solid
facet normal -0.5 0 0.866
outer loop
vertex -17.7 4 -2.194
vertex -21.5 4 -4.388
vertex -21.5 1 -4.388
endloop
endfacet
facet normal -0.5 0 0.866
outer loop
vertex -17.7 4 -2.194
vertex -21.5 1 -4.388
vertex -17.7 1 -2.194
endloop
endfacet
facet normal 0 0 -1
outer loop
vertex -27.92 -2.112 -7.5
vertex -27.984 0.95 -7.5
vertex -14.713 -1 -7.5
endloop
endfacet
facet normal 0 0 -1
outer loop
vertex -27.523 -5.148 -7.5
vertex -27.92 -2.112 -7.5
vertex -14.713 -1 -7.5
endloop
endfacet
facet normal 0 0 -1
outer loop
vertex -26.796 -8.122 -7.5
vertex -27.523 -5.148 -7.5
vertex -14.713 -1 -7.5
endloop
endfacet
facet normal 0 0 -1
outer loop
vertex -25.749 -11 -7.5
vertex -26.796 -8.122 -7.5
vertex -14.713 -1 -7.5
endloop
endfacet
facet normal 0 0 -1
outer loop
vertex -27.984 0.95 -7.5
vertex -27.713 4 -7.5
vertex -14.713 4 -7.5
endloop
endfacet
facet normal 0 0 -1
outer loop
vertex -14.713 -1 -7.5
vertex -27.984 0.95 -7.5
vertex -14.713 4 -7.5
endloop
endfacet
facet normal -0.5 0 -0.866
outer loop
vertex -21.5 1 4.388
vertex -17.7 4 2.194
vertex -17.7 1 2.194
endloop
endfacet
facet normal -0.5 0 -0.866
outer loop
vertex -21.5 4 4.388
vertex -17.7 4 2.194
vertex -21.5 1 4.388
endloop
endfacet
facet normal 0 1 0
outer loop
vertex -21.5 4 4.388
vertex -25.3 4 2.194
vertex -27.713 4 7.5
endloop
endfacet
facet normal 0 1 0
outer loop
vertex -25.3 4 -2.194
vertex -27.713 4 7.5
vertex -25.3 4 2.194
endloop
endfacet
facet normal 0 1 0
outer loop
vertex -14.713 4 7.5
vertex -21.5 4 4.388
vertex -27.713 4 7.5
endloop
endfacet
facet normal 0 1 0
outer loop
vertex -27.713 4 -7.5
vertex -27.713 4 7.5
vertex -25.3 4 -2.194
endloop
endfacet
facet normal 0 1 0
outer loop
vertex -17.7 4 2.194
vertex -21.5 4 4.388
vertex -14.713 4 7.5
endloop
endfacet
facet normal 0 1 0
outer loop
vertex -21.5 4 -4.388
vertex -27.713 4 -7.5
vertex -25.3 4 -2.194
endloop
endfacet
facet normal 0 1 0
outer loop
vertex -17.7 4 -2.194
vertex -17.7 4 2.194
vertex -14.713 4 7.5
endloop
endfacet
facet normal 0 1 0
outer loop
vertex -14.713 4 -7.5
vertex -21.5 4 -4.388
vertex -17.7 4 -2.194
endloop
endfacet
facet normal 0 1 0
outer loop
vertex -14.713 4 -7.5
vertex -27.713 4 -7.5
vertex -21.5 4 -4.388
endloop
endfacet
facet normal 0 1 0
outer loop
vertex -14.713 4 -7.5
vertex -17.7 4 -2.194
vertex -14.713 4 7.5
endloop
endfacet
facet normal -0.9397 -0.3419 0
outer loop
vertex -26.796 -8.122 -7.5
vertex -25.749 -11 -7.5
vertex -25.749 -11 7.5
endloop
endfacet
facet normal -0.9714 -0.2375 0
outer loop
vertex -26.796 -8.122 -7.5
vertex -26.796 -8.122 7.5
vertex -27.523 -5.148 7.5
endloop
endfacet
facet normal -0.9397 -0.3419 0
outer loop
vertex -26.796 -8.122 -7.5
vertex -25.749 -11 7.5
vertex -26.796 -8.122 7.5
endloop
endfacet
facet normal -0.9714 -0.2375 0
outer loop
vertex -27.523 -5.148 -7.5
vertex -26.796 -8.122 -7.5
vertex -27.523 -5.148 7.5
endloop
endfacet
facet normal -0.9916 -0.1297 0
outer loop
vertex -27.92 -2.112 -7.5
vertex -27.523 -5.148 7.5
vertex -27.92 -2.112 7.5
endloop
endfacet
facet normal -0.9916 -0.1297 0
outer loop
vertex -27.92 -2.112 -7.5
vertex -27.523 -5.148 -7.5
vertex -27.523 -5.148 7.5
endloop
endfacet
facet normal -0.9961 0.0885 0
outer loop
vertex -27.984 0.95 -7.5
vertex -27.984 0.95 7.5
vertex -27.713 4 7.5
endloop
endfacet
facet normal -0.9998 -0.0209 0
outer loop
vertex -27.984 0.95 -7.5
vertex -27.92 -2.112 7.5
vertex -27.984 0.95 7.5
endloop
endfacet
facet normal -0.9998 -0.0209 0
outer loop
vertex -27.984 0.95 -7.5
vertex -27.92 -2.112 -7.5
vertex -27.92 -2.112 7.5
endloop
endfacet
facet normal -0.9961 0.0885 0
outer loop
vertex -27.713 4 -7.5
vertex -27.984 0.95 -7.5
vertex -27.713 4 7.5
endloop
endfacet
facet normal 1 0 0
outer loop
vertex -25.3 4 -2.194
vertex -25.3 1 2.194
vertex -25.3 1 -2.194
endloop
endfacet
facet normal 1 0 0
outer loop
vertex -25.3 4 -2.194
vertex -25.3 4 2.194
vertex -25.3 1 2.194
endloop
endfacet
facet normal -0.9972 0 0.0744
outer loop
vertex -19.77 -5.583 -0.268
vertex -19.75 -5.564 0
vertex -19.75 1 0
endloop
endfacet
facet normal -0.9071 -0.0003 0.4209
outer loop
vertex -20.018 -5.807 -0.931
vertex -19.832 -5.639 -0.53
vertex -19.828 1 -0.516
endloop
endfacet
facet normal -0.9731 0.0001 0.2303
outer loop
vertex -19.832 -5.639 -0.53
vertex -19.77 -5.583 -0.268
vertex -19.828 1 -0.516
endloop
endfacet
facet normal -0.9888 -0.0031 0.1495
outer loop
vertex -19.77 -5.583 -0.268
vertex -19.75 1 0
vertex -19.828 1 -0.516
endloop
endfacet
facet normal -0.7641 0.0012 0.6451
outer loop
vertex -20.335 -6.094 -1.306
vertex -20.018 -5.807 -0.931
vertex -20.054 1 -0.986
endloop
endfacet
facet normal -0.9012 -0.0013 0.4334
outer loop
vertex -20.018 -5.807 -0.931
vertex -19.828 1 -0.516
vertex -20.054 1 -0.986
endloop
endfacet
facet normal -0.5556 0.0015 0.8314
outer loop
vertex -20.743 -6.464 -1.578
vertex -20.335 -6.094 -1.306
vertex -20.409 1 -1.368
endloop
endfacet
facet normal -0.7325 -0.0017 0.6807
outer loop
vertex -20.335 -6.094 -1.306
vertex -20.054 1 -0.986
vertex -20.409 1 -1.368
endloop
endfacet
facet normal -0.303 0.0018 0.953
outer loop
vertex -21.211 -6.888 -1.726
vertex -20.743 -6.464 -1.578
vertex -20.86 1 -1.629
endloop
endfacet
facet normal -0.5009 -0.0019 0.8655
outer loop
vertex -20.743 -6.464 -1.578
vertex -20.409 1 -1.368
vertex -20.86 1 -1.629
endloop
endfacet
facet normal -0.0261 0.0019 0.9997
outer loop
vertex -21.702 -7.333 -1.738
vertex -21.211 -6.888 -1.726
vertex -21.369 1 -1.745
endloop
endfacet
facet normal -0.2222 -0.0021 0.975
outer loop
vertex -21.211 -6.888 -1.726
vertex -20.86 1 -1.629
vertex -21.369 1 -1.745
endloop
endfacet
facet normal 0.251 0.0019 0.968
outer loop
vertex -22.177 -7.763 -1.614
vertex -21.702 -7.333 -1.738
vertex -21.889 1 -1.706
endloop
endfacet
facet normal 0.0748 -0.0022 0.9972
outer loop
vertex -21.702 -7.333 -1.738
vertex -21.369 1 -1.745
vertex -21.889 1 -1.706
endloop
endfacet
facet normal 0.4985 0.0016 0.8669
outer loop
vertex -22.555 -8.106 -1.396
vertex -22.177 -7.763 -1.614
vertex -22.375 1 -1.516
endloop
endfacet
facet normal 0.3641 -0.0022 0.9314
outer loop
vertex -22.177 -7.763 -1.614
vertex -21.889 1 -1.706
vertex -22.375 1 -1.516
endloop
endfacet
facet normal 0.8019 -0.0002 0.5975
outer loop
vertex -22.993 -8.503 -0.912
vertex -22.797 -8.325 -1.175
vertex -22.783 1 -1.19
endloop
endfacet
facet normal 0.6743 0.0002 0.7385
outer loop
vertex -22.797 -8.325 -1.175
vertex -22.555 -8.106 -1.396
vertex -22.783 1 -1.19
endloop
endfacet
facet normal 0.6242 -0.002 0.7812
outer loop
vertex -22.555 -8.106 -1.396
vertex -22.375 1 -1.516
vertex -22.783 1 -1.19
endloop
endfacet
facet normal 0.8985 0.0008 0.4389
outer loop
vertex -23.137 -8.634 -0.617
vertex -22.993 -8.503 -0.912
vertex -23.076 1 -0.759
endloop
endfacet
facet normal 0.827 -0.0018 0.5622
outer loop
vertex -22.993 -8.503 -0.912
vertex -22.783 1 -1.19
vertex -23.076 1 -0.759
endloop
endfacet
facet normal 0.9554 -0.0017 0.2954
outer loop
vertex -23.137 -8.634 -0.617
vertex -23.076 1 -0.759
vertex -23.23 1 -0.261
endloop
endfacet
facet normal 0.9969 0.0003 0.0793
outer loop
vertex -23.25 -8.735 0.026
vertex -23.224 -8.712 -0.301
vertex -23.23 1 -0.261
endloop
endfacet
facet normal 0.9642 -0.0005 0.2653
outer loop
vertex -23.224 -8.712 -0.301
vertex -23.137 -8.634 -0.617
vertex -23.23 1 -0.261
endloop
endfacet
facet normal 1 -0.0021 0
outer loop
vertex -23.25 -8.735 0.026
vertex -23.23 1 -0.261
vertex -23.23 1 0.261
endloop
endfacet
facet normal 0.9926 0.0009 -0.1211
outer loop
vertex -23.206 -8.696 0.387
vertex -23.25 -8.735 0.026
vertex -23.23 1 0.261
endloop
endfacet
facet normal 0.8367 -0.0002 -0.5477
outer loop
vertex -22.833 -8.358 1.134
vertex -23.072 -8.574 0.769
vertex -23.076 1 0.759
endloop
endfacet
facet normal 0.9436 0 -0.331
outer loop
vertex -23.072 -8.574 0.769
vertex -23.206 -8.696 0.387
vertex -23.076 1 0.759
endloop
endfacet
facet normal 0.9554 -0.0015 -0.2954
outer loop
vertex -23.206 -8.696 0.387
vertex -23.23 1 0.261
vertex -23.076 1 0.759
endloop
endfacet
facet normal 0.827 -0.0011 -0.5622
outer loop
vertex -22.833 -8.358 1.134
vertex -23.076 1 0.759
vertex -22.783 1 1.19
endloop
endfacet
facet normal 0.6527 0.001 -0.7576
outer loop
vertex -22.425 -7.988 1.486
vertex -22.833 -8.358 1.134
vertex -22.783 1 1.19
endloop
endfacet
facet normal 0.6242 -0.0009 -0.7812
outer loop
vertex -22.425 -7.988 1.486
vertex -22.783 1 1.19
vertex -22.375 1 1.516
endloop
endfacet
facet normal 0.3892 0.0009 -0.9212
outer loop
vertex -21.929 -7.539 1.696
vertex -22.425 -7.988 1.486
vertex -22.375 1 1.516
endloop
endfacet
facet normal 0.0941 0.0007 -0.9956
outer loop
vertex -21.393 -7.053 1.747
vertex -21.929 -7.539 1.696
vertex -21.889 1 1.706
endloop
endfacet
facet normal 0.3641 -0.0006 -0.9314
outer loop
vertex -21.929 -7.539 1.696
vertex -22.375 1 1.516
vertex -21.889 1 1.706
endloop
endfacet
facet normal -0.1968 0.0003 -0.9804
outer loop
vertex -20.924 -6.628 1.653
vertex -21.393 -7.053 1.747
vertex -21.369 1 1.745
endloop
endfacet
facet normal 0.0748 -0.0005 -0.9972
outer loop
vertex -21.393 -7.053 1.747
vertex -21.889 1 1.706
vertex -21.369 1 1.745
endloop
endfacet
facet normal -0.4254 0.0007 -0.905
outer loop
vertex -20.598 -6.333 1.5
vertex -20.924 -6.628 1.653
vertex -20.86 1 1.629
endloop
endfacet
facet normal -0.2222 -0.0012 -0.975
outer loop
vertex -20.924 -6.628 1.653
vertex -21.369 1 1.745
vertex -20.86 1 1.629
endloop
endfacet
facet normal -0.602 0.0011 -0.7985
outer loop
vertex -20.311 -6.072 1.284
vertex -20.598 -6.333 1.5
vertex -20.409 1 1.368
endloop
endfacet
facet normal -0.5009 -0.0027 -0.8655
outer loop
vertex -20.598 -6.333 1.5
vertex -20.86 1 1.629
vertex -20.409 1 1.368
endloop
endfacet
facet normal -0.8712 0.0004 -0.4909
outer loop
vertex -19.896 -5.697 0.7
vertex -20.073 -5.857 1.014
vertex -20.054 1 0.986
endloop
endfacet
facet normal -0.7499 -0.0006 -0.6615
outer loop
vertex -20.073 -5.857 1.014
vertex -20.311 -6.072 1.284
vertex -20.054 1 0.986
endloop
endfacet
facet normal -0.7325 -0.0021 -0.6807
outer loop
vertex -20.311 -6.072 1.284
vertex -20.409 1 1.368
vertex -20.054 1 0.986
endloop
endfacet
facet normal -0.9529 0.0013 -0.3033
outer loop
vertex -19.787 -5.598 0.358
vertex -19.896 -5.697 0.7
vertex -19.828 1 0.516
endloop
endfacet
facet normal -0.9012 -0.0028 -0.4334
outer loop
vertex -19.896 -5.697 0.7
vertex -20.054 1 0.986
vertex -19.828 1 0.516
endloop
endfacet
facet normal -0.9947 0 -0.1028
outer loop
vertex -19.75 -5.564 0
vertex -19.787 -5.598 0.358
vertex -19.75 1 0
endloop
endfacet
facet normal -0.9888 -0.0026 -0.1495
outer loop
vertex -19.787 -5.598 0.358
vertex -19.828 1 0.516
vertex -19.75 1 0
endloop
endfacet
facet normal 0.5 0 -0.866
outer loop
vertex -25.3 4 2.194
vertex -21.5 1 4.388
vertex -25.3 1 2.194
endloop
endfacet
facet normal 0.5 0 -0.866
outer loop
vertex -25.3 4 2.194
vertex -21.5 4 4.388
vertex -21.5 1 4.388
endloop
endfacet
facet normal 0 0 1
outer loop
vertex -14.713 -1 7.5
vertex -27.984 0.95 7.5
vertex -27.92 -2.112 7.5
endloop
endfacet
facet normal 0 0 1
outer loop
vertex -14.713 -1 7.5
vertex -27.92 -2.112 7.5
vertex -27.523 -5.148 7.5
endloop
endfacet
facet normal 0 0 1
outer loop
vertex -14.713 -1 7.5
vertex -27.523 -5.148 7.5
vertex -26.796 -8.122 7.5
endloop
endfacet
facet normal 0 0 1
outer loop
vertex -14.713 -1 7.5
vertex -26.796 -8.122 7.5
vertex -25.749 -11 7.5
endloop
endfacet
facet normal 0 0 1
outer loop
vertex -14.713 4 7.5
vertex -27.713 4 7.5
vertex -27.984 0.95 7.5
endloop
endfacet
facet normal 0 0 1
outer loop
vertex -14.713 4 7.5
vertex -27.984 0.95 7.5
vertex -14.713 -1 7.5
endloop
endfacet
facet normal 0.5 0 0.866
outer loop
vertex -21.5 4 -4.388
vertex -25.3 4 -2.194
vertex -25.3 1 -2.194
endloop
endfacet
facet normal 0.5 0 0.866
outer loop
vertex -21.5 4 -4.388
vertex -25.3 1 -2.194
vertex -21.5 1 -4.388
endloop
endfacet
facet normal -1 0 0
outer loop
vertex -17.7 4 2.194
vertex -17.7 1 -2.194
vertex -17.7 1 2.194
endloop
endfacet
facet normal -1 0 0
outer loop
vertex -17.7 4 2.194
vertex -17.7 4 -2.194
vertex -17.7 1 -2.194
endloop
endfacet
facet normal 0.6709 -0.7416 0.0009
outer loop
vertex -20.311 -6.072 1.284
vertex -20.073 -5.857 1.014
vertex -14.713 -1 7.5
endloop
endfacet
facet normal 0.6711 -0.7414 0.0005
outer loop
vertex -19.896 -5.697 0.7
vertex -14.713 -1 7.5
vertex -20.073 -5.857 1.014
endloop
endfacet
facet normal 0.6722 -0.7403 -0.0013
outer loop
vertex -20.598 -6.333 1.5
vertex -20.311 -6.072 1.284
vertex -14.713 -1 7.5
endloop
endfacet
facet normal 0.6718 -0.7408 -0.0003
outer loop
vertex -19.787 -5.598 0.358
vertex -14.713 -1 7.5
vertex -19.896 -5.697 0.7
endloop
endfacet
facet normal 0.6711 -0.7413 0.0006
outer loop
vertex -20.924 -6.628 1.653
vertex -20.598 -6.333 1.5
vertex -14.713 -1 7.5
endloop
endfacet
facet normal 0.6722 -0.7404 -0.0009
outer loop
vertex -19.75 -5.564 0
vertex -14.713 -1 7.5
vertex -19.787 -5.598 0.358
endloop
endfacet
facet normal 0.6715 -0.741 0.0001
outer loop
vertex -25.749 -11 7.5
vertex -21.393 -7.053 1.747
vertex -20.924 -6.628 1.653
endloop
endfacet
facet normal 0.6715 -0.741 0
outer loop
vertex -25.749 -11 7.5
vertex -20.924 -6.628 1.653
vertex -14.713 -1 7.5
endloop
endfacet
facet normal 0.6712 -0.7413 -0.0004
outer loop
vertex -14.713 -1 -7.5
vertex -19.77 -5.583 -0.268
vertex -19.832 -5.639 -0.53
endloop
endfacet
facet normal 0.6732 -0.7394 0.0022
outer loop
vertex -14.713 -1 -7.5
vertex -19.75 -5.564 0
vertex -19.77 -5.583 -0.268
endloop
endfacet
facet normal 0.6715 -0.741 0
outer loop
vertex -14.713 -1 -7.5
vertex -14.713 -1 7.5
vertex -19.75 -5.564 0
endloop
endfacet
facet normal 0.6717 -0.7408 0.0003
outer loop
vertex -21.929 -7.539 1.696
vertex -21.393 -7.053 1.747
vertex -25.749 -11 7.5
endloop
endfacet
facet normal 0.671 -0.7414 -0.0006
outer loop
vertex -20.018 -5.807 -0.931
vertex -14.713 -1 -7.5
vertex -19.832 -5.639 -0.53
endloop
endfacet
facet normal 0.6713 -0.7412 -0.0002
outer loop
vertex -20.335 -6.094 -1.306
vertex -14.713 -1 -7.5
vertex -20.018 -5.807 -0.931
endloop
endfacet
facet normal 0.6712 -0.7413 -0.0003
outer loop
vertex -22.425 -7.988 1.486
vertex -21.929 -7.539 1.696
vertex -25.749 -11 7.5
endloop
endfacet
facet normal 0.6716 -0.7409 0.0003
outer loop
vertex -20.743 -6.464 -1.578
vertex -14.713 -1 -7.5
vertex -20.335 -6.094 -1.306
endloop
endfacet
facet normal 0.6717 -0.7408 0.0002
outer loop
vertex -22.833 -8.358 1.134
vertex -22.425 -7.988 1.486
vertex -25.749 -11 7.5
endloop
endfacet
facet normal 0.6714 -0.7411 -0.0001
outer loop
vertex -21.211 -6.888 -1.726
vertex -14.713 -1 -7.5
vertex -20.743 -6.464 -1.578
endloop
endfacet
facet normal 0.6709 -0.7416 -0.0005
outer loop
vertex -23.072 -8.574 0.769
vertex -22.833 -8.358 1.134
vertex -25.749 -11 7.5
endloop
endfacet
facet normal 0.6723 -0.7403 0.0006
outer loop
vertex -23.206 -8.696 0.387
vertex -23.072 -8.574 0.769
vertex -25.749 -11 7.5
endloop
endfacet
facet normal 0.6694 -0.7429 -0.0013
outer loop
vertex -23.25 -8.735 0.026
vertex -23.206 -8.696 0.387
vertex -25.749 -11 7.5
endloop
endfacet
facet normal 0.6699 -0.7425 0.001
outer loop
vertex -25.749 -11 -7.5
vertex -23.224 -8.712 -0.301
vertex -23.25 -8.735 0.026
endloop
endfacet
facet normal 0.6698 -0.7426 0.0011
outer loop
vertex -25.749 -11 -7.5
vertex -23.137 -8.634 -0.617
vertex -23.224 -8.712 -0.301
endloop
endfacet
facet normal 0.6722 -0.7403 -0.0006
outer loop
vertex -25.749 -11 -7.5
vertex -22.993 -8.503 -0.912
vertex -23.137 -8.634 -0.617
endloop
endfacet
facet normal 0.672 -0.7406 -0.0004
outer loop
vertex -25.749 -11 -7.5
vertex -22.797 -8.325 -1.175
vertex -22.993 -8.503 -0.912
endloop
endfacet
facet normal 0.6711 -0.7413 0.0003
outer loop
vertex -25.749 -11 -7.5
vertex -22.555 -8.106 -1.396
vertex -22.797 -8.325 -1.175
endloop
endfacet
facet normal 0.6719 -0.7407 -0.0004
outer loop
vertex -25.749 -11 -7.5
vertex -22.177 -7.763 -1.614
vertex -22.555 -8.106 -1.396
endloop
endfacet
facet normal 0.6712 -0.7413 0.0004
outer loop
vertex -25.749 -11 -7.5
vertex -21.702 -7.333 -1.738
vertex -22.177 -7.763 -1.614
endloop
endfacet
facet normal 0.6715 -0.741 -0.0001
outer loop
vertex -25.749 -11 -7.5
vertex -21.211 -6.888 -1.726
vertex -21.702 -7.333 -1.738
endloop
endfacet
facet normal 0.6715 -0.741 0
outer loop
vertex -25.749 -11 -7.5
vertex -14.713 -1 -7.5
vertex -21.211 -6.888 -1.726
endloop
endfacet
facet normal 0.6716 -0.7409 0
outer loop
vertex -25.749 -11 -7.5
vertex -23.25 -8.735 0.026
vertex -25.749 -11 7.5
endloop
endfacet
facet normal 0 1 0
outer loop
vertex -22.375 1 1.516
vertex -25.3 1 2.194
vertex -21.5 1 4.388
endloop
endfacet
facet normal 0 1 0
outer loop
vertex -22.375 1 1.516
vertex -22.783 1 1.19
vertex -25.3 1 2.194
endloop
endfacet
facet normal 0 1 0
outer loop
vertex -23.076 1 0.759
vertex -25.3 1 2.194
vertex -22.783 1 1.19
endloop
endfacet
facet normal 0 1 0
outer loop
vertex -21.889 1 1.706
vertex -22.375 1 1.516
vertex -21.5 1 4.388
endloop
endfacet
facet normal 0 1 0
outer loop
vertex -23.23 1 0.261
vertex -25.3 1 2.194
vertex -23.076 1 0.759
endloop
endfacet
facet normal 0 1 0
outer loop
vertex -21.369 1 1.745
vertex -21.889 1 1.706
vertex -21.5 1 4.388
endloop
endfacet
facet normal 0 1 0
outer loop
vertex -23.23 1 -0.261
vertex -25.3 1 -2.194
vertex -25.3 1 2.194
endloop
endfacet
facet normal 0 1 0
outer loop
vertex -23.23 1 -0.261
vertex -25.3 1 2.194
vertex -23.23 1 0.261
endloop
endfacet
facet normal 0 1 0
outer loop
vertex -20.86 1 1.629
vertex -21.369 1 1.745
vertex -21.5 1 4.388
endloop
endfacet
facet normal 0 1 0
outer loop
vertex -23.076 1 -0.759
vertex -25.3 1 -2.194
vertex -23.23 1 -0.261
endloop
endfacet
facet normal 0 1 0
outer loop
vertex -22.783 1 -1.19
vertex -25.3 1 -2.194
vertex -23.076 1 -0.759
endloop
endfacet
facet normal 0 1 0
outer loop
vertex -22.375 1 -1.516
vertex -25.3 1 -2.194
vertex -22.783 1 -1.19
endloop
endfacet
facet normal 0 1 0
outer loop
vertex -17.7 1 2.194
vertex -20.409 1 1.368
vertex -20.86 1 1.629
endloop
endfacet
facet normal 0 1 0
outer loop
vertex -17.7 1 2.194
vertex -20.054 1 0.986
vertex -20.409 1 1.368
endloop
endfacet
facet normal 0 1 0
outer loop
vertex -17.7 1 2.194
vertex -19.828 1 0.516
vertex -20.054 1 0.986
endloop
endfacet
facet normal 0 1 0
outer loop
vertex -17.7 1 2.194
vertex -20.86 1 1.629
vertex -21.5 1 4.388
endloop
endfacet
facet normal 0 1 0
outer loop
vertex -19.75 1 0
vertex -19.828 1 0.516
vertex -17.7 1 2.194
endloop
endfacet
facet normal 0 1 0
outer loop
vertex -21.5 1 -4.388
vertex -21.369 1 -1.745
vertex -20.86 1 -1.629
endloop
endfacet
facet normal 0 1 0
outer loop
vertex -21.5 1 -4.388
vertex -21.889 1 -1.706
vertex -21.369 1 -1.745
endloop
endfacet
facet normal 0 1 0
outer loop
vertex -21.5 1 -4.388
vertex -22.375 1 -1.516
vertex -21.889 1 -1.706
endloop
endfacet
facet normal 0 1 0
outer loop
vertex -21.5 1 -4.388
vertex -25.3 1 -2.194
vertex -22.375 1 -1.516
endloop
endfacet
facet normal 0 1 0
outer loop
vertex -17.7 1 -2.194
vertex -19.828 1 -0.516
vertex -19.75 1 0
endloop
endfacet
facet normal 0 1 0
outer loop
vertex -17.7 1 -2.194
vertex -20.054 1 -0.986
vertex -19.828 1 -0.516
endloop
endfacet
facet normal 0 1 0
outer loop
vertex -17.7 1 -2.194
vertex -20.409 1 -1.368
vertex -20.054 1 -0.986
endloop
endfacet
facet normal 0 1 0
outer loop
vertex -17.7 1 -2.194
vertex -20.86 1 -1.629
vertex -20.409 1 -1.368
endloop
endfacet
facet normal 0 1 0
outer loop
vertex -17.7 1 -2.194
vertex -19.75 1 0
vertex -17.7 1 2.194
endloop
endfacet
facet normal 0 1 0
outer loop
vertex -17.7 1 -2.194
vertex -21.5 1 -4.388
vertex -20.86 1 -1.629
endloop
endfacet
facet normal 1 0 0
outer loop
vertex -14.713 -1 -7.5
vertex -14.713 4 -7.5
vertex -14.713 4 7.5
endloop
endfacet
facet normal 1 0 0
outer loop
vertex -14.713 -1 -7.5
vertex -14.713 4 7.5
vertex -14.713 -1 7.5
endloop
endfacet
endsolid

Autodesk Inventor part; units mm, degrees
ref_plane "YZ Plane" through (0, 0, 0) normal (1, 0, 0) x (0, 1, 0)
ref_plane "XZ Plane" through (0, 0, 0) normal (0, 1, 0) x (-1, 0, 0)
ref_plane "XY Plane" through (0, 0, 0) normal (0, 0, 1) x (1, 0, 0)
sketch "Sketch1" plane through (0, 0, 0) normal (0, 0, 1) x (1, 0, 0)
  circle A0 centre (0, 0) radius 28
  line L0 (-27.5, 5.5) -> (27.5, 5.5)
  line L1 (27.5, 5.5) -> (27.5, 4)
  line L2 (27.5, 4) -> (-27.5, 4)
  line L3 (-27.5, 4) -> (-27.5, 5.5)
  line L4 (-27.7128, 4) -> (27.7128, 4)
  line L5 (-14.7128, 4) -> (-14.7128, -1)
  line L6 (-14.7128, -1) -> (-25.7488, -11)
  line L7 (-27.5, 4.75) -> (-21.5, 4.75)
  dimension "d0" = 56
  dimension "d1" = 55
  dimension "d2" = 1.5
  dimension "d3" = 27.5
  dimension "d4" = 4
  dimension "d5" = 4
  dimension "d6" = 5
  dimension "d7" = 13
  dimension "d8" = 15
  dimension "d12" = 6
  dimension "d13" = 6.2128
extrude "Extrusion1" add sketch "Sketch1" along normal mid plane 15 contours A0 L4 L2 L5 L6 picked at (-22.5928, -6.0493)
sketch "Sketch2" plane through (-27.7128, 4, 7.5) normal (0, 1, 0) x (1, 0, 0)
  line L0 (6.213, 11.8879) -> (10.013, 9.6939)
  line L1 (10.013, 9.6939) -> (10.013, 5.3061)
  line L2 (10.013, 5.3061) -> (6.213, 3.1121)
  line L3 (6.213, 3.1121) -> (2.413, 5.3061)
  line L4 (2.413, 5.3061) -> (2.413, 9.6939)
  line L5 (2.413, 9.6939) -> (6.213, 11.8879)
  line L6 (0, 15) -> (0, 0) projected
  line L7 (13, 15) -> (13, 0) projected
  line L8 (13, 7.5) -> (0, 7.5)
  point P0 (27.7128, 7.5)
  point P1 (6.213, 7.5)
  dimension "d14" = 6.213
  dimension "d15" = 0
  dimension "d16" = 7.6
extrude "Extrusion2" cut sketch "Sketch2" against normal blind 3
sketch "Sketch3" plane through (-27.7128, 1, 7.5) normal (0, 1, 0) x (1, 0, 0)
  circle A0 centre (6.213, 7.5) radius 1.75
  point P0 (27.7128, 7.5)
  dimension "d19" = 3.5
extrude "Extrusion3" cut sketch "Sketch3" against normal blind 10
properties part number "Soporte placa"
